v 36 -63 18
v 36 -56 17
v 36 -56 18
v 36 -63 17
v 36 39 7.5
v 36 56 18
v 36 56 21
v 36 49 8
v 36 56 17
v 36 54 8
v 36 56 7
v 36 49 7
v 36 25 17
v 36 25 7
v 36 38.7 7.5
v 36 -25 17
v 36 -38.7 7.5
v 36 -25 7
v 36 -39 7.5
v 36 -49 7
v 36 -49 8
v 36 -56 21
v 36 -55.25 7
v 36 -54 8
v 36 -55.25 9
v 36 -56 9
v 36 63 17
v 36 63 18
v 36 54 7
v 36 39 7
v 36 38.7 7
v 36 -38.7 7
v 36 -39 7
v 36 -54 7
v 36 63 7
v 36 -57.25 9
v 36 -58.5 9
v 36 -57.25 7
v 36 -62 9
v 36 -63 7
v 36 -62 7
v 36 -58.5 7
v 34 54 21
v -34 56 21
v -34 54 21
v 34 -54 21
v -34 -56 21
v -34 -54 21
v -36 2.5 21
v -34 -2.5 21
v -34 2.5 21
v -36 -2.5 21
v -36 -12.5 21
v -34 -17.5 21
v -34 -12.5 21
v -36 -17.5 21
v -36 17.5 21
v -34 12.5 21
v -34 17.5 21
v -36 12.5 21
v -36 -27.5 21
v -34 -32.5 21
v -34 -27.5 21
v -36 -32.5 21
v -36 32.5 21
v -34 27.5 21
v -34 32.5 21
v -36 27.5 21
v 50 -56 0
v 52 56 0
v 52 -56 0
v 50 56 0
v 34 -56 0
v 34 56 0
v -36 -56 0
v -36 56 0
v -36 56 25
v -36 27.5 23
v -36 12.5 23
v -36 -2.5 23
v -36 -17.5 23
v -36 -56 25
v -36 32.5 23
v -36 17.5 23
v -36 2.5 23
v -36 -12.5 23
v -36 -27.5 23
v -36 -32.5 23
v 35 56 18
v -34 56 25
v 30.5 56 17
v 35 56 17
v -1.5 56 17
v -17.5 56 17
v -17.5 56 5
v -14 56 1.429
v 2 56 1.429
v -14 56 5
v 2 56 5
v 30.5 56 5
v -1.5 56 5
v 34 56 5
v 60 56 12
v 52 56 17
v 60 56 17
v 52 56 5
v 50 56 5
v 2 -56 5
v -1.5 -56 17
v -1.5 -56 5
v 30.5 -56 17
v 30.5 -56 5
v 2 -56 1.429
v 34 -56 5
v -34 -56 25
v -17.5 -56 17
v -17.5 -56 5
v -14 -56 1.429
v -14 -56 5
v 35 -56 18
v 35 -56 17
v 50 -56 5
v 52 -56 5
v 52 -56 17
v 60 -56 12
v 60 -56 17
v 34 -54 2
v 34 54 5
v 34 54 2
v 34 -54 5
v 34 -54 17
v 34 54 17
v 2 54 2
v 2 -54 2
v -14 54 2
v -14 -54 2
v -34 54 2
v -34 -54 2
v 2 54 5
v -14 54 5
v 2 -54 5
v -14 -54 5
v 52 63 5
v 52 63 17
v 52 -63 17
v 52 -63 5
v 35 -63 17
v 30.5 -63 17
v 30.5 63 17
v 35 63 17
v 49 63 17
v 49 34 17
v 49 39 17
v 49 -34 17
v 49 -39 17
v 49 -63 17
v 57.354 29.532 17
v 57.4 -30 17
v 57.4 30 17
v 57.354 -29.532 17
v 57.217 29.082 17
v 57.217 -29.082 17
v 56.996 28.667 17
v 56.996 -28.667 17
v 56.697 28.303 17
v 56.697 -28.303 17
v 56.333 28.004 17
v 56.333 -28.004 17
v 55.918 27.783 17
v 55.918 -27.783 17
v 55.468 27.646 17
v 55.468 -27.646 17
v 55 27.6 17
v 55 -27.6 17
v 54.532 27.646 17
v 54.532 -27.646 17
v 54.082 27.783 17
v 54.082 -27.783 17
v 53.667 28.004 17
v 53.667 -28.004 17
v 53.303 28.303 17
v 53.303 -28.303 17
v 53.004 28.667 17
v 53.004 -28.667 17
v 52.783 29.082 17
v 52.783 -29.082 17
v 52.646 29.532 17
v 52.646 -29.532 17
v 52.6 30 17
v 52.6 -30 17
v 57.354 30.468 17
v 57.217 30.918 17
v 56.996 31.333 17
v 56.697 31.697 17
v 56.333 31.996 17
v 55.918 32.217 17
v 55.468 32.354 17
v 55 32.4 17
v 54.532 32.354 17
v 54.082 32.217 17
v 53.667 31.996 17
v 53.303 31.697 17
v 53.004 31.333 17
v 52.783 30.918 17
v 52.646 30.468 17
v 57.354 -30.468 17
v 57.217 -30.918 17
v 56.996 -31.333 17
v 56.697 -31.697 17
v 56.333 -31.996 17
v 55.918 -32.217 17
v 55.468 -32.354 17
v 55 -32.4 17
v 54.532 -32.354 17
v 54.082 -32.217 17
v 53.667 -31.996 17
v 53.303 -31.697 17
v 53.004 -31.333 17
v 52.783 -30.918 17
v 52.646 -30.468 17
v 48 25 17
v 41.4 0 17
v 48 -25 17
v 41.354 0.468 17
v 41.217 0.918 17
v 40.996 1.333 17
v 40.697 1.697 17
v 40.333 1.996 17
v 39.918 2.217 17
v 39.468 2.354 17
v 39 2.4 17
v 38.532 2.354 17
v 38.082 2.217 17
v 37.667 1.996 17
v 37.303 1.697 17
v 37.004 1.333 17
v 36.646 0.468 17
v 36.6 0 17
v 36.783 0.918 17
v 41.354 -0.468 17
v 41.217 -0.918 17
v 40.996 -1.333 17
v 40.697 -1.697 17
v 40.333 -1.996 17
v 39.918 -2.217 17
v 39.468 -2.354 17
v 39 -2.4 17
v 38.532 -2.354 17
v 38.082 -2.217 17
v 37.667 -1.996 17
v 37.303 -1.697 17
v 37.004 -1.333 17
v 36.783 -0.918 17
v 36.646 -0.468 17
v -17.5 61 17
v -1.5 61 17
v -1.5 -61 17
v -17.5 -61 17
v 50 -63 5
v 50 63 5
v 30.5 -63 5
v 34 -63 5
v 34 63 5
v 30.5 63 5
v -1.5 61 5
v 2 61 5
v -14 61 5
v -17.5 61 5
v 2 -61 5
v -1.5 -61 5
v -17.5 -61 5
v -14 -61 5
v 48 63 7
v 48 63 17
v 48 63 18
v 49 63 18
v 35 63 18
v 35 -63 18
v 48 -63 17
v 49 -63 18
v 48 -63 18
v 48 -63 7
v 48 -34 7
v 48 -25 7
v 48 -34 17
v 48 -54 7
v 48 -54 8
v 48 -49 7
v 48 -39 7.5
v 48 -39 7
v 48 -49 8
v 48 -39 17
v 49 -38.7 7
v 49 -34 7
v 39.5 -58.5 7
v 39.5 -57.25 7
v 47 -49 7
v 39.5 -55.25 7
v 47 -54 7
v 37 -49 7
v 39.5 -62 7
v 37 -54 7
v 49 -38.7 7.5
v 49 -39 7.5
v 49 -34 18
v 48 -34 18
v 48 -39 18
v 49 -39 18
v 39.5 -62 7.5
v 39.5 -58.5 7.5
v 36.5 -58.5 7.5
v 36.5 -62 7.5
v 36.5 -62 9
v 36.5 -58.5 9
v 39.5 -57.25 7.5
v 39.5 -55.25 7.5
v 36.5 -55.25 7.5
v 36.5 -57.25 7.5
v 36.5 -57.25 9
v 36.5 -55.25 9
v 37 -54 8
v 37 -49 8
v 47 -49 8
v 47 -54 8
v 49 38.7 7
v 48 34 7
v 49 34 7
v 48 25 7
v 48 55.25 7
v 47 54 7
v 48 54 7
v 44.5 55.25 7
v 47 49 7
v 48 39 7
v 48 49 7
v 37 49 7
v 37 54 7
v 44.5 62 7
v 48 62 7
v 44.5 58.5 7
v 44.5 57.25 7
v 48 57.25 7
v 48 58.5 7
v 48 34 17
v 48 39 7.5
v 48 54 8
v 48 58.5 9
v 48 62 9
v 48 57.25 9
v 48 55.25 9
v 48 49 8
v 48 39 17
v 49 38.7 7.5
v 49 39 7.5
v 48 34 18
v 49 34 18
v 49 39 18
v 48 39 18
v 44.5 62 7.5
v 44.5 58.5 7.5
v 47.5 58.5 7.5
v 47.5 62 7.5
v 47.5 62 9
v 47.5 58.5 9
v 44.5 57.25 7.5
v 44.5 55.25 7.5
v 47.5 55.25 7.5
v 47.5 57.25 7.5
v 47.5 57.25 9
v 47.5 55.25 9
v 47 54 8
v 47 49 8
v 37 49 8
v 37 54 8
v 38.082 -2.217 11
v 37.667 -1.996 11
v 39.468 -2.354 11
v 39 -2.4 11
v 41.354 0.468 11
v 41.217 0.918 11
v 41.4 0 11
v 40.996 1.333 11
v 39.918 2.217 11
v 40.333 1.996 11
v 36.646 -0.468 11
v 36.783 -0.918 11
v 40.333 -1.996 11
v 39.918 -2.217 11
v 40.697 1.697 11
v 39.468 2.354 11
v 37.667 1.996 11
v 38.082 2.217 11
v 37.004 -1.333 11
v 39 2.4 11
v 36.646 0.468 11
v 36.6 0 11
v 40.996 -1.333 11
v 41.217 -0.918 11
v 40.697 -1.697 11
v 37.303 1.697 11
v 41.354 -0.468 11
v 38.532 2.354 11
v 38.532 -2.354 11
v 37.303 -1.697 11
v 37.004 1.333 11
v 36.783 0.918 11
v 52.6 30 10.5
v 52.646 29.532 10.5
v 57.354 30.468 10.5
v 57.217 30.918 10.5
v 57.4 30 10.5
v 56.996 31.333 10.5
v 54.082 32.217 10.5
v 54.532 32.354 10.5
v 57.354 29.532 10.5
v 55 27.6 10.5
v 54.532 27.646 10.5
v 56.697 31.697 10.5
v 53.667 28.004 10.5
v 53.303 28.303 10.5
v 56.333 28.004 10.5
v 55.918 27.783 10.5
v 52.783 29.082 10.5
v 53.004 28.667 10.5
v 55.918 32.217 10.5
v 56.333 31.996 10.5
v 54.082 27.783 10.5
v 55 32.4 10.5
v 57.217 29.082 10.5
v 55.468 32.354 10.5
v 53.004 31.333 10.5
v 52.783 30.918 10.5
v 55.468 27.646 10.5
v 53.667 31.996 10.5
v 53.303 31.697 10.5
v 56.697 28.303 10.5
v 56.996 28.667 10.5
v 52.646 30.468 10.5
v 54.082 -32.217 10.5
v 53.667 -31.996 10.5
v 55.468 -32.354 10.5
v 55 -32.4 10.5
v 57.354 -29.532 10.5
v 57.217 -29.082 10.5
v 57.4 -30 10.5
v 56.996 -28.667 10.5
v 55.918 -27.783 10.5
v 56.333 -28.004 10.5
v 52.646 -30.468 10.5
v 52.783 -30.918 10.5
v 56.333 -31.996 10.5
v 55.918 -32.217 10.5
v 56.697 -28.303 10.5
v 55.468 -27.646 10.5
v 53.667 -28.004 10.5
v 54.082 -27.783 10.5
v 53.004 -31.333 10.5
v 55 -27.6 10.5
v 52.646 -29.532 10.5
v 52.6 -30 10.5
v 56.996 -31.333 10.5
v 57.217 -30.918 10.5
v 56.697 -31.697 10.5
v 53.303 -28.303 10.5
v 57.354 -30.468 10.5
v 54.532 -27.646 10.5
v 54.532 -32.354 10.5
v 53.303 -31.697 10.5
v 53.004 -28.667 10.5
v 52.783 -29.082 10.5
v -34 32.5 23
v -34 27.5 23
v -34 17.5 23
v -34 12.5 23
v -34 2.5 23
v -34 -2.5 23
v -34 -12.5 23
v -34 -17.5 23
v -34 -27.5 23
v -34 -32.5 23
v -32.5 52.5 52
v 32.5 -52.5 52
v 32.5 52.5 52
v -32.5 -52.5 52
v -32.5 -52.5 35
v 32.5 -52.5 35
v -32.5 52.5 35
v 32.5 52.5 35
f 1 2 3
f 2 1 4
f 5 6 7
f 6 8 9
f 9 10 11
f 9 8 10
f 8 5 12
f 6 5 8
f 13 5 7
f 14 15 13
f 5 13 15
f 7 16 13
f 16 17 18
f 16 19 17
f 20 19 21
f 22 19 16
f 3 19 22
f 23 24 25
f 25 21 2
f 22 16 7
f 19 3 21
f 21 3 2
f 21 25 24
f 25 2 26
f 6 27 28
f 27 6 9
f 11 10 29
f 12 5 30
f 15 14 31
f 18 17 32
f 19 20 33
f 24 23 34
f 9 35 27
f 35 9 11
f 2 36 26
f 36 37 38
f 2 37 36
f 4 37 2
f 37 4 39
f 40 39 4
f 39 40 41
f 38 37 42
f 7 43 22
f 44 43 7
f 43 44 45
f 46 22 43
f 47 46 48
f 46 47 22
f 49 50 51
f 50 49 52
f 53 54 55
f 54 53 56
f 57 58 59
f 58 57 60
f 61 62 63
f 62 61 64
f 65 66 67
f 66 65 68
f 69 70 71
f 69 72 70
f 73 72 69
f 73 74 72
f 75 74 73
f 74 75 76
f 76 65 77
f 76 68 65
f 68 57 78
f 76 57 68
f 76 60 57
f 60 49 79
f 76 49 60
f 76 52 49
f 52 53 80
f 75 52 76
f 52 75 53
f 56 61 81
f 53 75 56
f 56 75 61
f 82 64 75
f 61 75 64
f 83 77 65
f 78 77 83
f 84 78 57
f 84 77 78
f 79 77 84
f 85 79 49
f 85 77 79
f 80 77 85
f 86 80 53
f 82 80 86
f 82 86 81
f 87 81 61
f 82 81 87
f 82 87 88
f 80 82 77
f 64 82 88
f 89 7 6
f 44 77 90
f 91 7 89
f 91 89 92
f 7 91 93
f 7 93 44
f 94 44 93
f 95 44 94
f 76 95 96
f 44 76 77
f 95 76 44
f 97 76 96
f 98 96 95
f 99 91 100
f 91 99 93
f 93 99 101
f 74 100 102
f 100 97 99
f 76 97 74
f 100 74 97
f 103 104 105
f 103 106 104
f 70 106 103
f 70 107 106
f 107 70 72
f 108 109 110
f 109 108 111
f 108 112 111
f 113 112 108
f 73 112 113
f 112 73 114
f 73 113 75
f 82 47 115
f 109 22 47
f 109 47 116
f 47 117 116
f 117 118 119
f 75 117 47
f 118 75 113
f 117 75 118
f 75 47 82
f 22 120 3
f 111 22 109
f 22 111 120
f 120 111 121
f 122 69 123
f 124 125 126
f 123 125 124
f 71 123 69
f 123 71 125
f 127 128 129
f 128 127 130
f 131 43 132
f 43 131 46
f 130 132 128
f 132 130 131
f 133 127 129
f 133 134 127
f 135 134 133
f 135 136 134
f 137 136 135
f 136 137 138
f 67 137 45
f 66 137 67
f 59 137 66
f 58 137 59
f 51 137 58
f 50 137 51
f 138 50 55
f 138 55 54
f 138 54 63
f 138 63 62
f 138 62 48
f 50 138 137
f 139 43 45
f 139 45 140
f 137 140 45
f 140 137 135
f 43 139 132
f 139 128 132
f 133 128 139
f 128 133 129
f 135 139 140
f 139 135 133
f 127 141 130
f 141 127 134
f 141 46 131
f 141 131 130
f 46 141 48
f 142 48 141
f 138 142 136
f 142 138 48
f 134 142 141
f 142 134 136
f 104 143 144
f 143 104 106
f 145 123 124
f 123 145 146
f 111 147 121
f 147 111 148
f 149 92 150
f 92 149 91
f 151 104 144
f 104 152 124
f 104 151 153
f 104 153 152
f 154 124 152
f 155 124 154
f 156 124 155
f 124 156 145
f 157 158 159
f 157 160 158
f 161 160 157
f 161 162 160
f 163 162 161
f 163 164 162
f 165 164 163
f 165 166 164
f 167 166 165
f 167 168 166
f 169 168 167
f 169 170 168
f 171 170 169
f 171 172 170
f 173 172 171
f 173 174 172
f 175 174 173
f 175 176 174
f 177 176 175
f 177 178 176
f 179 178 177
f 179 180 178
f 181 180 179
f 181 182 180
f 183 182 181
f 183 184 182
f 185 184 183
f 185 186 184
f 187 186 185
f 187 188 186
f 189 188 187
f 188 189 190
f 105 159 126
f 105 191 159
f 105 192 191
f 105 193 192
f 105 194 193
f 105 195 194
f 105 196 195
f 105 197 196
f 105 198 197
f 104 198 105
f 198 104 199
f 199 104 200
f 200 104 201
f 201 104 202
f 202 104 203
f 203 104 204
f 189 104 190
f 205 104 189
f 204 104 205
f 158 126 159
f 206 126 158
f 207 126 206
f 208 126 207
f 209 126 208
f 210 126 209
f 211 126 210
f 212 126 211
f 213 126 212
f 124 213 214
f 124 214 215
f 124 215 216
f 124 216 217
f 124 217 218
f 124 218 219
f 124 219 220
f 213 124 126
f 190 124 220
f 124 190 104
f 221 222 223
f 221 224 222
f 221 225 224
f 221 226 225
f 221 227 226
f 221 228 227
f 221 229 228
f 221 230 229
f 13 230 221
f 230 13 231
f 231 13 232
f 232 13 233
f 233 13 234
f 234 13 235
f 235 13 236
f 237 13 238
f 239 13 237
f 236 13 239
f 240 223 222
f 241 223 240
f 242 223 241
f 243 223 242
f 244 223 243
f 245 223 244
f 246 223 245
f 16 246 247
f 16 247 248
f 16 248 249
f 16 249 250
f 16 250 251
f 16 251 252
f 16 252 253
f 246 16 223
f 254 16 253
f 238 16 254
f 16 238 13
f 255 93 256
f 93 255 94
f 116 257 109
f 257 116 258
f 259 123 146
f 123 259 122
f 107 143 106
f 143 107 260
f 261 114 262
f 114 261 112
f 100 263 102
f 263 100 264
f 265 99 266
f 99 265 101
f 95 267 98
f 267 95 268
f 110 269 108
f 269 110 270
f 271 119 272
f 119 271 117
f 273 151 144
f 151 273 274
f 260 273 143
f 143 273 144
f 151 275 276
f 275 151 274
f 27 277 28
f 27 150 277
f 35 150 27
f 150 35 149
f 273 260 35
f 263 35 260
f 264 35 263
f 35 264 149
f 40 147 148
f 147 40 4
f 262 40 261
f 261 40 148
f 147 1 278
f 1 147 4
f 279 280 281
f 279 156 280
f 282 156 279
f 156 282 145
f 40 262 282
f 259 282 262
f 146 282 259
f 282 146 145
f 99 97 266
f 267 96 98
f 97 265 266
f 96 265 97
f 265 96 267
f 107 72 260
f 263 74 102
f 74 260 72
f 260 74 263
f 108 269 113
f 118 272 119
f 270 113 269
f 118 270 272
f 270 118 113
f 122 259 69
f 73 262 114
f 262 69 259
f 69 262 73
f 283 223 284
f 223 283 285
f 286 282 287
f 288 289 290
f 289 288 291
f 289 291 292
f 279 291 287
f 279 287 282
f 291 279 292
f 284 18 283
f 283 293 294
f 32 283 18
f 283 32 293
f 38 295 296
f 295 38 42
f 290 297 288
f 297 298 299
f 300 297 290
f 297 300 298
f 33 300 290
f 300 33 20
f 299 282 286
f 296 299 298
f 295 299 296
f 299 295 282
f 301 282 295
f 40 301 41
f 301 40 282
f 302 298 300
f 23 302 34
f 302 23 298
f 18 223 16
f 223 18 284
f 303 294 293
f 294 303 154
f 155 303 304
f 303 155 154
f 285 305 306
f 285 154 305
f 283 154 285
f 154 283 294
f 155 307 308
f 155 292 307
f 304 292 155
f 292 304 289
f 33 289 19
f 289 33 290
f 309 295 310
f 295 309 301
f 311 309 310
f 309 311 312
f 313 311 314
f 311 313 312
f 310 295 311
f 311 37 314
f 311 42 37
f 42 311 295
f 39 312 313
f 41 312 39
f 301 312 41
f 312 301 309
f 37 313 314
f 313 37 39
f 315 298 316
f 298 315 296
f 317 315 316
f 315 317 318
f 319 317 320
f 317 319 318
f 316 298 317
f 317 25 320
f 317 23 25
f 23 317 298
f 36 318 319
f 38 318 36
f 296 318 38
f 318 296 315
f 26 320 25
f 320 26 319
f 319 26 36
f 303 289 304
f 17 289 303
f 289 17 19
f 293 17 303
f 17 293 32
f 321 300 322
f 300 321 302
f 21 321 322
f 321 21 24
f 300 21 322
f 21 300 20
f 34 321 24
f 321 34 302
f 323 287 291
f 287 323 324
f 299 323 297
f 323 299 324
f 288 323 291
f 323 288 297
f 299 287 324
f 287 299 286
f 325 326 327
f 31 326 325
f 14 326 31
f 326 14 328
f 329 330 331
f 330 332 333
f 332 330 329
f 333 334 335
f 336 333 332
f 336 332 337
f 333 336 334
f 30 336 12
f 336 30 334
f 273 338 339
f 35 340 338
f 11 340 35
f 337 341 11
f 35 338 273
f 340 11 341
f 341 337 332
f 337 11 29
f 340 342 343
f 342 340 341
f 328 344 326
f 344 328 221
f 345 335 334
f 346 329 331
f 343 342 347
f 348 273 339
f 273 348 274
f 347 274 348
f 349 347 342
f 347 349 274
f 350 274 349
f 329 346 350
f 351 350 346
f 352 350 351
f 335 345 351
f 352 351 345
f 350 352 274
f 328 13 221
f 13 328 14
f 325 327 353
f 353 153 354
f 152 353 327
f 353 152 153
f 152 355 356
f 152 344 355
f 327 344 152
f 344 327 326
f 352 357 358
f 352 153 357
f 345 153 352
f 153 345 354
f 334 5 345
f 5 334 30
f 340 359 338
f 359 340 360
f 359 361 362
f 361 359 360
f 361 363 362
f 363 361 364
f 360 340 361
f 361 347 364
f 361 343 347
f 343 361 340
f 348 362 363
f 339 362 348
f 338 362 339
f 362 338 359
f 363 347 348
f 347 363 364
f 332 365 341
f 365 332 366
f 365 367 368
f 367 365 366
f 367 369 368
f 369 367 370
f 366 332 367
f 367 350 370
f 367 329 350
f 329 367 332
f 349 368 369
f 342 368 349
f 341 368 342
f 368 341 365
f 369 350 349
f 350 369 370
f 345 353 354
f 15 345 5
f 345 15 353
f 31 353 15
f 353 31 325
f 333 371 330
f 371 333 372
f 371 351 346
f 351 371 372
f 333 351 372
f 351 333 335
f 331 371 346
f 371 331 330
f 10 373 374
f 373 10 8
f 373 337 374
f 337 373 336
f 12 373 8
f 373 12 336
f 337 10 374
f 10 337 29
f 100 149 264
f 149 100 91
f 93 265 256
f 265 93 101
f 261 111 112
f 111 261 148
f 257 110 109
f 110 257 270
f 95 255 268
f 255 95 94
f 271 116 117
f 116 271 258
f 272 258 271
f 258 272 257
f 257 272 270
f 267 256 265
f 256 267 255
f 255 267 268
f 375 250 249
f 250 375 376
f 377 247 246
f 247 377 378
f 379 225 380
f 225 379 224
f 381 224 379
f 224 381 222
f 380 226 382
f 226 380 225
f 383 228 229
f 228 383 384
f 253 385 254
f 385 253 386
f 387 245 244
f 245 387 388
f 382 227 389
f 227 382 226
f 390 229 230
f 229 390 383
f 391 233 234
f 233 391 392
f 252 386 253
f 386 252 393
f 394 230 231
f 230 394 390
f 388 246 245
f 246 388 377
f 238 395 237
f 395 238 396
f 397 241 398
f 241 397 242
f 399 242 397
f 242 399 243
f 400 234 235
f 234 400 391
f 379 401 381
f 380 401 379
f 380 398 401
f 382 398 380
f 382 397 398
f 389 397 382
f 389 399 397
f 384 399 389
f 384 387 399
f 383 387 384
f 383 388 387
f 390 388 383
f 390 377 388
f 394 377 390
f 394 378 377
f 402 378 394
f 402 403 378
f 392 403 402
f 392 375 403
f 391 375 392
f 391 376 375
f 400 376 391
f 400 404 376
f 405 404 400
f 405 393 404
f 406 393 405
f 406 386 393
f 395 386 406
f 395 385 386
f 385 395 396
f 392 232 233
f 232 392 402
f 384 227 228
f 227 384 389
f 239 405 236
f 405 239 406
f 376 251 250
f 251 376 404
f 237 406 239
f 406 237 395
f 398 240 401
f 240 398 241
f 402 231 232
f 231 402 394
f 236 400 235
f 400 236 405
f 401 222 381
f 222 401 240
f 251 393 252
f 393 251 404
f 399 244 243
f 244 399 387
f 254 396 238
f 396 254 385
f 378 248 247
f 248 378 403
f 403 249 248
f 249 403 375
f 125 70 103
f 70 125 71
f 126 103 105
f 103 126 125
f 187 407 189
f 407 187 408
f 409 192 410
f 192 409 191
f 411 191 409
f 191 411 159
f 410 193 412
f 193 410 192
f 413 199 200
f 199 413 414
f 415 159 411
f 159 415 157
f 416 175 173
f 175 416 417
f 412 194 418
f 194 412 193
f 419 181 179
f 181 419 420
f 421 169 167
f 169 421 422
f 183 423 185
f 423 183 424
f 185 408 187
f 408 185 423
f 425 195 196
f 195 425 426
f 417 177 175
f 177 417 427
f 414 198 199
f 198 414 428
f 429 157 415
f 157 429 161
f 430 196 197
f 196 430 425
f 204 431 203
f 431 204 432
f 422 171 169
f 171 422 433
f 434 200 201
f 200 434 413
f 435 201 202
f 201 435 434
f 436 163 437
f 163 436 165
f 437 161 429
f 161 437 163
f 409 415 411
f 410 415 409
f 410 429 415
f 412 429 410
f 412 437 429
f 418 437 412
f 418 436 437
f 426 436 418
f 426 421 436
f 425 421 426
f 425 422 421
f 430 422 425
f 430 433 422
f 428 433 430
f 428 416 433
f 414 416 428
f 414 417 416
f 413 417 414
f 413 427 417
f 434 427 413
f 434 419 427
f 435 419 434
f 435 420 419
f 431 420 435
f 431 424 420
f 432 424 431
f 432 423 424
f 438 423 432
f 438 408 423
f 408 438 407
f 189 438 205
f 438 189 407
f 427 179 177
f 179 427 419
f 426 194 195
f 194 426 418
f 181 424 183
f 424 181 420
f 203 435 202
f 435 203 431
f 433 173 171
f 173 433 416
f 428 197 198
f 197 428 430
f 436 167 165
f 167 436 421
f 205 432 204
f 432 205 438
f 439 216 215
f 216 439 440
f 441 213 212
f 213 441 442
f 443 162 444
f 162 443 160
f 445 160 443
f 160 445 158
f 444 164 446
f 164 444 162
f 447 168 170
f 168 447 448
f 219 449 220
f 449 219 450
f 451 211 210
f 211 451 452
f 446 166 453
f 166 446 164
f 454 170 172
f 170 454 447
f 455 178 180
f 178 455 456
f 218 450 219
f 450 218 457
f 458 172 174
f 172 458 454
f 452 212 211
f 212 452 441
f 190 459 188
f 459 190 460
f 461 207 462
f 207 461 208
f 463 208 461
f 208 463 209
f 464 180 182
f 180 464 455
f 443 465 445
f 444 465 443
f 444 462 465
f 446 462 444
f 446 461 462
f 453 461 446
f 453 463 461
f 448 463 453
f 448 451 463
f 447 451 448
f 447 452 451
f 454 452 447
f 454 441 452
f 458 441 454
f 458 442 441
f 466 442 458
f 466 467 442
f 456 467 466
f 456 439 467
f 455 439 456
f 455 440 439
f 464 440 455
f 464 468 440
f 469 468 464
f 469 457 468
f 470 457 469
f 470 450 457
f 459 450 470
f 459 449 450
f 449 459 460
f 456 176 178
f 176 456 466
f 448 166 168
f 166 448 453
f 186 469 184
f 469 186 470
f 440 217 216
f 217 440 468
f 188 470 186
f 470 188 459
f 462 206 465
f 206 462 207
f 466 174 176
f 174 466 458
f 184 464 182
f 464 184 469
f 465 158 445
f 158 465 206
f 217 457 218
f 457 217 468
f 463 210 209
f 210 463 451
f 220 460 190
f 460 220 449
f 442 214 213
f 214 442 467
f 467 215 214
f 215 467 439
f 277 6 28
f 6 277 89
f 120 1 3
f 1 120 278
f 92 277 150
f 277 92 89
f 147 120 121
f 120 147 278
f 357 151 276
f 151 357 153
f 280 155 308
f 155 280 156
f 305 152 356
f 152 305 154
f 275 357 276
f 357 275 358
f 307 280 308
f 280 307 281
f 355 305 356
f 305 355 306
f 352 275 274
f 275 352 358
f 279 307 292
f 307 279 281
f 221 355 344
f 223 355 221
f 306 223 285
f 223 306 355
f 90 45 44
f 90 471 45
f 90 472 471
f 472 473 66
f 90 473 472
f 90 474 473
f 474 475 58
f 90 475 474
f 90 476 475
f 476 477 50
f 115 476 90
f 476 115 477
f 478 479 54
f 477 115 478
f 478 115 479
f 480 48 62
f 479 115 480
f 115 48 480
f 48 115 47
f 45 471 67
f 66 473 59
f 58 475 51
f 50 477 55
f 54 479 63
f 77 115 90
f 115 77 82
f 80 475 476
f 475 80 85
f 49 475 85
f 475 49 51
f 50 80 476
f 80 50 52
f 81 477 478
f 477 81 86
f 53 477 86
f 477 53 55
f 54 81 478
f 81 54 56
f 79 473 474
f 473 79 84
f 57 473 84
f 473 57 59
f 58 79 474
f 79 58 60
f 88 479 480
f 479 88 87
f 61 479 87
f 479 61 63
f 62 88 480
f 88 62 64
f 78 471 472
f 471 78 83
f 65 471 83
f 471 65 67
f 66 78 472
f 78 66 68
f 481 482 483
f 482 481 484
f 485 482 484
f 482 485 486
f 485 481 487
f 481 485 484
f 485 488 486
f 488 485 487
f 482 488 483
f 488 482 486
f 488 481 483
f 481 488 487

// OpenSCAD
batt_l = 68;
batt_w = 108;
batt_h = 19;


w_off = batt_l/2 - 16;

pi_l = 65;
pi_w = 56;
pi_hole_space_l = 58;
pi_hole_space_w = 49;

wheel_dist_l = 48;
m3_insert_d = 4.8;

t = 2;

    //h=9.5+t*2+2;
    
    top_space = 4;
    h=12;


translate([0,0,35])
rotate([0,0,90])
cube_center([105,65,17]);



    translate([batt_l/2+7+1.5*t,0,0])
    cube_center([16,batt_w+2*t,6]);

difference() {
    cube_center([batt_l+2*t,batt_w+2*t,batt_h + t]);
    translate([0,0,t])
    cube_center([batt_l,batt_w,batt_h * 2]);
    
        translate([-wheel_dist_l/2+w_off,0,(h+t)/2+batt_h+t-h-top_space])
        rotate([90,0,0])
        cylinder(d=m3_insert_d, h=100, center=true, $fn=32);
}

wheelbars();

module cube_center(dims) {
    translate([-dims[0]/2, -dims[1]/2, 0])
    cube(dims);
}



module wheelbars() {
    
    //h=15.5;
    
    translate([0,0,batt_h+t - h - top_space])
    difference() {
        union() {
            
            translate([0,batt_w/2+t+3.5,0])
            translate([6+t/2,0,0])
            cube_center([batt_l + 2*t + 16 + t, 7, h]);
            translate([0,-(batt_w/2+t+3.5),0])
            translate([6+t/2,0,0])
            cube_center([batt_l + 2*t + 16 + t, 7, h]);
            
            translate([batt_l/2 + 6 + t*1.5 ,0,0])
            cube_center([16+t,batt_w + 2*t, h]);
        
            translate([-wheel_dist_l/2+w_off,batt_w/2+t-2,-5])
            triangle2();
            translate([wheel_dist_l/2+w_off,batt_w/2+t,-5])
            triangle2();
        translate([-wheel_dist_l/2+w_off,-(batt_w/2+t)+2,-5])
            scale([1,-1,1])
        triangle2();
        translate([wheel_dist_l/2+w_off,-(batt_w/2+t),-5])
            scale([1,-1,1])
            triangle2();    
                    
        }
    
        translate([14.5,batt_w/2 + 7, 0])
        cube_center([32, 10, h]);
        
        translate([14.5,-(batt_w/2 + 7), 0])
        cube_center([32, 10, h]);
        
        translate([-32.5,batt_w/2 + 7, 0])
        cube_center([30, 10, h]);
        
        translate([-32.5,-(batt_w/2 + 7), 0])
        cube_center([30, 10, h]);
        
        
        translate([-32.5,-(batt_w/2 + 7+ 5), 0])
        cube_center([80, 10, h]);
        
        translate([-32.5,(batt_w/2 + 7+ 5), 0])
        cube_center([80, 10, h]);
        
        translate([-wheel_dist_l/2+w_off,0,(h+t)/2])
        rotate([90,0,0])
        cylinder(d=m3_insert_d, h=100, center=true, $fn=32);
        
        
    translate([wheel_dist_l/2+w_off-3,-0,h-6])
        cylinder(d=m3_insert_d,h=100,$fn=32);
        
        // motor mount cutouts
        for(sign=[-1:2:1])
        translate([wheel_dist_l/2+w_off,sign*(batt_w/2 + t +7 - 38/2),t])
        rotate([0,0,sign*90+90])
        motor_mount_cutout();
        
    }
    
}

module motor_mount_cutout() {
        difference() {
            union() {
                cube_center([12,38.001,9.5+5]);
                translate([0,-38/2+24+5/2,0])
                cube_center([14,5,9.5+5]);
            }
            translate([-4,-38/2+1+3.5/2,0])
            cube_center([3,3.5,0.5]);
            translate([-5.75,-38/2+1+3.5/2,0])
            cube_center([0.5,3.5,2]);
            
            translate([-4,-38/2+5.75+2/2,0])
            cube_center([3,2,0.5]);
            translate([-5.75,-38/2+5.75+2/2,0])
            cube_center([0.5,2,2]);
            
            translate([0,-38/2+24+0.3/2,0])
            cube_center([14,0.3,0.5]);
            
            translate([-12/2+1/2,-38/2+9+5/2,0])
            cube_center([1,5,1]);
            translate([12/2-1/2,-38/2+9+5/2,0])
            cube_center([1,5,1]);
        }
}

translate([+batt_l/2+2*t+14,0,0])
{
    difference() {
        scale([-1,1,1]) triangle();
        translate([3,30,batt_h+t-top_space - 6.5])
        cylinder(d=m3_insert_d,h=100,$fn=32);
        translate([3,-30,batt_h+t-top_space - 6.5])
        cylinder(d=m3_insert_d,h=100,$fn=32);
    }
}

module triangle() {
scale([1,1,1])
rotate([0,-90,90])
linear_extrude(height = batt_w+2*t, center = true, convexity = 10, twist = 0)
polygon(points=[[0,0],[12,8],[batt_h+t-top_space,8],[batt_h+t-top_space,0]]);
}

module triangle2() {
scale([1,1,1])
rotate([0,-90,0])
linear_extrude(height = 16, center = true, convexity = 10, twist = 0)
polygon(points=[[0,0],[5,7],[5,0]]);
}

for(q=[0:1:1])
translate([w_off +17.5+ q*13,0,batt_h + t - top_space])
difference() {
    cube_center([1,batt_w+2*7+2*t,1]);
    for(sign=[-1:2:1])
    translate([0,sign*(batt_w/2-17.5),0])
    cube_center([5,5,5]);
}

translate([-batt_l/2-t/2,0,batt_h+t]) {
    difference() {
        cube_center([2,batt_w+2*t,4]);
        cube_center([2,5,2]);
        translate([0,-15,0])
        cube_center([2,5,2]);
        translate([0,15,0])
        cube_center([2,5,2]);
        translate([0,-30,0])
        cube_center([2,5,2]);
        translate([0,30,0])
        cube_center([2,5,2]);
    }
}
